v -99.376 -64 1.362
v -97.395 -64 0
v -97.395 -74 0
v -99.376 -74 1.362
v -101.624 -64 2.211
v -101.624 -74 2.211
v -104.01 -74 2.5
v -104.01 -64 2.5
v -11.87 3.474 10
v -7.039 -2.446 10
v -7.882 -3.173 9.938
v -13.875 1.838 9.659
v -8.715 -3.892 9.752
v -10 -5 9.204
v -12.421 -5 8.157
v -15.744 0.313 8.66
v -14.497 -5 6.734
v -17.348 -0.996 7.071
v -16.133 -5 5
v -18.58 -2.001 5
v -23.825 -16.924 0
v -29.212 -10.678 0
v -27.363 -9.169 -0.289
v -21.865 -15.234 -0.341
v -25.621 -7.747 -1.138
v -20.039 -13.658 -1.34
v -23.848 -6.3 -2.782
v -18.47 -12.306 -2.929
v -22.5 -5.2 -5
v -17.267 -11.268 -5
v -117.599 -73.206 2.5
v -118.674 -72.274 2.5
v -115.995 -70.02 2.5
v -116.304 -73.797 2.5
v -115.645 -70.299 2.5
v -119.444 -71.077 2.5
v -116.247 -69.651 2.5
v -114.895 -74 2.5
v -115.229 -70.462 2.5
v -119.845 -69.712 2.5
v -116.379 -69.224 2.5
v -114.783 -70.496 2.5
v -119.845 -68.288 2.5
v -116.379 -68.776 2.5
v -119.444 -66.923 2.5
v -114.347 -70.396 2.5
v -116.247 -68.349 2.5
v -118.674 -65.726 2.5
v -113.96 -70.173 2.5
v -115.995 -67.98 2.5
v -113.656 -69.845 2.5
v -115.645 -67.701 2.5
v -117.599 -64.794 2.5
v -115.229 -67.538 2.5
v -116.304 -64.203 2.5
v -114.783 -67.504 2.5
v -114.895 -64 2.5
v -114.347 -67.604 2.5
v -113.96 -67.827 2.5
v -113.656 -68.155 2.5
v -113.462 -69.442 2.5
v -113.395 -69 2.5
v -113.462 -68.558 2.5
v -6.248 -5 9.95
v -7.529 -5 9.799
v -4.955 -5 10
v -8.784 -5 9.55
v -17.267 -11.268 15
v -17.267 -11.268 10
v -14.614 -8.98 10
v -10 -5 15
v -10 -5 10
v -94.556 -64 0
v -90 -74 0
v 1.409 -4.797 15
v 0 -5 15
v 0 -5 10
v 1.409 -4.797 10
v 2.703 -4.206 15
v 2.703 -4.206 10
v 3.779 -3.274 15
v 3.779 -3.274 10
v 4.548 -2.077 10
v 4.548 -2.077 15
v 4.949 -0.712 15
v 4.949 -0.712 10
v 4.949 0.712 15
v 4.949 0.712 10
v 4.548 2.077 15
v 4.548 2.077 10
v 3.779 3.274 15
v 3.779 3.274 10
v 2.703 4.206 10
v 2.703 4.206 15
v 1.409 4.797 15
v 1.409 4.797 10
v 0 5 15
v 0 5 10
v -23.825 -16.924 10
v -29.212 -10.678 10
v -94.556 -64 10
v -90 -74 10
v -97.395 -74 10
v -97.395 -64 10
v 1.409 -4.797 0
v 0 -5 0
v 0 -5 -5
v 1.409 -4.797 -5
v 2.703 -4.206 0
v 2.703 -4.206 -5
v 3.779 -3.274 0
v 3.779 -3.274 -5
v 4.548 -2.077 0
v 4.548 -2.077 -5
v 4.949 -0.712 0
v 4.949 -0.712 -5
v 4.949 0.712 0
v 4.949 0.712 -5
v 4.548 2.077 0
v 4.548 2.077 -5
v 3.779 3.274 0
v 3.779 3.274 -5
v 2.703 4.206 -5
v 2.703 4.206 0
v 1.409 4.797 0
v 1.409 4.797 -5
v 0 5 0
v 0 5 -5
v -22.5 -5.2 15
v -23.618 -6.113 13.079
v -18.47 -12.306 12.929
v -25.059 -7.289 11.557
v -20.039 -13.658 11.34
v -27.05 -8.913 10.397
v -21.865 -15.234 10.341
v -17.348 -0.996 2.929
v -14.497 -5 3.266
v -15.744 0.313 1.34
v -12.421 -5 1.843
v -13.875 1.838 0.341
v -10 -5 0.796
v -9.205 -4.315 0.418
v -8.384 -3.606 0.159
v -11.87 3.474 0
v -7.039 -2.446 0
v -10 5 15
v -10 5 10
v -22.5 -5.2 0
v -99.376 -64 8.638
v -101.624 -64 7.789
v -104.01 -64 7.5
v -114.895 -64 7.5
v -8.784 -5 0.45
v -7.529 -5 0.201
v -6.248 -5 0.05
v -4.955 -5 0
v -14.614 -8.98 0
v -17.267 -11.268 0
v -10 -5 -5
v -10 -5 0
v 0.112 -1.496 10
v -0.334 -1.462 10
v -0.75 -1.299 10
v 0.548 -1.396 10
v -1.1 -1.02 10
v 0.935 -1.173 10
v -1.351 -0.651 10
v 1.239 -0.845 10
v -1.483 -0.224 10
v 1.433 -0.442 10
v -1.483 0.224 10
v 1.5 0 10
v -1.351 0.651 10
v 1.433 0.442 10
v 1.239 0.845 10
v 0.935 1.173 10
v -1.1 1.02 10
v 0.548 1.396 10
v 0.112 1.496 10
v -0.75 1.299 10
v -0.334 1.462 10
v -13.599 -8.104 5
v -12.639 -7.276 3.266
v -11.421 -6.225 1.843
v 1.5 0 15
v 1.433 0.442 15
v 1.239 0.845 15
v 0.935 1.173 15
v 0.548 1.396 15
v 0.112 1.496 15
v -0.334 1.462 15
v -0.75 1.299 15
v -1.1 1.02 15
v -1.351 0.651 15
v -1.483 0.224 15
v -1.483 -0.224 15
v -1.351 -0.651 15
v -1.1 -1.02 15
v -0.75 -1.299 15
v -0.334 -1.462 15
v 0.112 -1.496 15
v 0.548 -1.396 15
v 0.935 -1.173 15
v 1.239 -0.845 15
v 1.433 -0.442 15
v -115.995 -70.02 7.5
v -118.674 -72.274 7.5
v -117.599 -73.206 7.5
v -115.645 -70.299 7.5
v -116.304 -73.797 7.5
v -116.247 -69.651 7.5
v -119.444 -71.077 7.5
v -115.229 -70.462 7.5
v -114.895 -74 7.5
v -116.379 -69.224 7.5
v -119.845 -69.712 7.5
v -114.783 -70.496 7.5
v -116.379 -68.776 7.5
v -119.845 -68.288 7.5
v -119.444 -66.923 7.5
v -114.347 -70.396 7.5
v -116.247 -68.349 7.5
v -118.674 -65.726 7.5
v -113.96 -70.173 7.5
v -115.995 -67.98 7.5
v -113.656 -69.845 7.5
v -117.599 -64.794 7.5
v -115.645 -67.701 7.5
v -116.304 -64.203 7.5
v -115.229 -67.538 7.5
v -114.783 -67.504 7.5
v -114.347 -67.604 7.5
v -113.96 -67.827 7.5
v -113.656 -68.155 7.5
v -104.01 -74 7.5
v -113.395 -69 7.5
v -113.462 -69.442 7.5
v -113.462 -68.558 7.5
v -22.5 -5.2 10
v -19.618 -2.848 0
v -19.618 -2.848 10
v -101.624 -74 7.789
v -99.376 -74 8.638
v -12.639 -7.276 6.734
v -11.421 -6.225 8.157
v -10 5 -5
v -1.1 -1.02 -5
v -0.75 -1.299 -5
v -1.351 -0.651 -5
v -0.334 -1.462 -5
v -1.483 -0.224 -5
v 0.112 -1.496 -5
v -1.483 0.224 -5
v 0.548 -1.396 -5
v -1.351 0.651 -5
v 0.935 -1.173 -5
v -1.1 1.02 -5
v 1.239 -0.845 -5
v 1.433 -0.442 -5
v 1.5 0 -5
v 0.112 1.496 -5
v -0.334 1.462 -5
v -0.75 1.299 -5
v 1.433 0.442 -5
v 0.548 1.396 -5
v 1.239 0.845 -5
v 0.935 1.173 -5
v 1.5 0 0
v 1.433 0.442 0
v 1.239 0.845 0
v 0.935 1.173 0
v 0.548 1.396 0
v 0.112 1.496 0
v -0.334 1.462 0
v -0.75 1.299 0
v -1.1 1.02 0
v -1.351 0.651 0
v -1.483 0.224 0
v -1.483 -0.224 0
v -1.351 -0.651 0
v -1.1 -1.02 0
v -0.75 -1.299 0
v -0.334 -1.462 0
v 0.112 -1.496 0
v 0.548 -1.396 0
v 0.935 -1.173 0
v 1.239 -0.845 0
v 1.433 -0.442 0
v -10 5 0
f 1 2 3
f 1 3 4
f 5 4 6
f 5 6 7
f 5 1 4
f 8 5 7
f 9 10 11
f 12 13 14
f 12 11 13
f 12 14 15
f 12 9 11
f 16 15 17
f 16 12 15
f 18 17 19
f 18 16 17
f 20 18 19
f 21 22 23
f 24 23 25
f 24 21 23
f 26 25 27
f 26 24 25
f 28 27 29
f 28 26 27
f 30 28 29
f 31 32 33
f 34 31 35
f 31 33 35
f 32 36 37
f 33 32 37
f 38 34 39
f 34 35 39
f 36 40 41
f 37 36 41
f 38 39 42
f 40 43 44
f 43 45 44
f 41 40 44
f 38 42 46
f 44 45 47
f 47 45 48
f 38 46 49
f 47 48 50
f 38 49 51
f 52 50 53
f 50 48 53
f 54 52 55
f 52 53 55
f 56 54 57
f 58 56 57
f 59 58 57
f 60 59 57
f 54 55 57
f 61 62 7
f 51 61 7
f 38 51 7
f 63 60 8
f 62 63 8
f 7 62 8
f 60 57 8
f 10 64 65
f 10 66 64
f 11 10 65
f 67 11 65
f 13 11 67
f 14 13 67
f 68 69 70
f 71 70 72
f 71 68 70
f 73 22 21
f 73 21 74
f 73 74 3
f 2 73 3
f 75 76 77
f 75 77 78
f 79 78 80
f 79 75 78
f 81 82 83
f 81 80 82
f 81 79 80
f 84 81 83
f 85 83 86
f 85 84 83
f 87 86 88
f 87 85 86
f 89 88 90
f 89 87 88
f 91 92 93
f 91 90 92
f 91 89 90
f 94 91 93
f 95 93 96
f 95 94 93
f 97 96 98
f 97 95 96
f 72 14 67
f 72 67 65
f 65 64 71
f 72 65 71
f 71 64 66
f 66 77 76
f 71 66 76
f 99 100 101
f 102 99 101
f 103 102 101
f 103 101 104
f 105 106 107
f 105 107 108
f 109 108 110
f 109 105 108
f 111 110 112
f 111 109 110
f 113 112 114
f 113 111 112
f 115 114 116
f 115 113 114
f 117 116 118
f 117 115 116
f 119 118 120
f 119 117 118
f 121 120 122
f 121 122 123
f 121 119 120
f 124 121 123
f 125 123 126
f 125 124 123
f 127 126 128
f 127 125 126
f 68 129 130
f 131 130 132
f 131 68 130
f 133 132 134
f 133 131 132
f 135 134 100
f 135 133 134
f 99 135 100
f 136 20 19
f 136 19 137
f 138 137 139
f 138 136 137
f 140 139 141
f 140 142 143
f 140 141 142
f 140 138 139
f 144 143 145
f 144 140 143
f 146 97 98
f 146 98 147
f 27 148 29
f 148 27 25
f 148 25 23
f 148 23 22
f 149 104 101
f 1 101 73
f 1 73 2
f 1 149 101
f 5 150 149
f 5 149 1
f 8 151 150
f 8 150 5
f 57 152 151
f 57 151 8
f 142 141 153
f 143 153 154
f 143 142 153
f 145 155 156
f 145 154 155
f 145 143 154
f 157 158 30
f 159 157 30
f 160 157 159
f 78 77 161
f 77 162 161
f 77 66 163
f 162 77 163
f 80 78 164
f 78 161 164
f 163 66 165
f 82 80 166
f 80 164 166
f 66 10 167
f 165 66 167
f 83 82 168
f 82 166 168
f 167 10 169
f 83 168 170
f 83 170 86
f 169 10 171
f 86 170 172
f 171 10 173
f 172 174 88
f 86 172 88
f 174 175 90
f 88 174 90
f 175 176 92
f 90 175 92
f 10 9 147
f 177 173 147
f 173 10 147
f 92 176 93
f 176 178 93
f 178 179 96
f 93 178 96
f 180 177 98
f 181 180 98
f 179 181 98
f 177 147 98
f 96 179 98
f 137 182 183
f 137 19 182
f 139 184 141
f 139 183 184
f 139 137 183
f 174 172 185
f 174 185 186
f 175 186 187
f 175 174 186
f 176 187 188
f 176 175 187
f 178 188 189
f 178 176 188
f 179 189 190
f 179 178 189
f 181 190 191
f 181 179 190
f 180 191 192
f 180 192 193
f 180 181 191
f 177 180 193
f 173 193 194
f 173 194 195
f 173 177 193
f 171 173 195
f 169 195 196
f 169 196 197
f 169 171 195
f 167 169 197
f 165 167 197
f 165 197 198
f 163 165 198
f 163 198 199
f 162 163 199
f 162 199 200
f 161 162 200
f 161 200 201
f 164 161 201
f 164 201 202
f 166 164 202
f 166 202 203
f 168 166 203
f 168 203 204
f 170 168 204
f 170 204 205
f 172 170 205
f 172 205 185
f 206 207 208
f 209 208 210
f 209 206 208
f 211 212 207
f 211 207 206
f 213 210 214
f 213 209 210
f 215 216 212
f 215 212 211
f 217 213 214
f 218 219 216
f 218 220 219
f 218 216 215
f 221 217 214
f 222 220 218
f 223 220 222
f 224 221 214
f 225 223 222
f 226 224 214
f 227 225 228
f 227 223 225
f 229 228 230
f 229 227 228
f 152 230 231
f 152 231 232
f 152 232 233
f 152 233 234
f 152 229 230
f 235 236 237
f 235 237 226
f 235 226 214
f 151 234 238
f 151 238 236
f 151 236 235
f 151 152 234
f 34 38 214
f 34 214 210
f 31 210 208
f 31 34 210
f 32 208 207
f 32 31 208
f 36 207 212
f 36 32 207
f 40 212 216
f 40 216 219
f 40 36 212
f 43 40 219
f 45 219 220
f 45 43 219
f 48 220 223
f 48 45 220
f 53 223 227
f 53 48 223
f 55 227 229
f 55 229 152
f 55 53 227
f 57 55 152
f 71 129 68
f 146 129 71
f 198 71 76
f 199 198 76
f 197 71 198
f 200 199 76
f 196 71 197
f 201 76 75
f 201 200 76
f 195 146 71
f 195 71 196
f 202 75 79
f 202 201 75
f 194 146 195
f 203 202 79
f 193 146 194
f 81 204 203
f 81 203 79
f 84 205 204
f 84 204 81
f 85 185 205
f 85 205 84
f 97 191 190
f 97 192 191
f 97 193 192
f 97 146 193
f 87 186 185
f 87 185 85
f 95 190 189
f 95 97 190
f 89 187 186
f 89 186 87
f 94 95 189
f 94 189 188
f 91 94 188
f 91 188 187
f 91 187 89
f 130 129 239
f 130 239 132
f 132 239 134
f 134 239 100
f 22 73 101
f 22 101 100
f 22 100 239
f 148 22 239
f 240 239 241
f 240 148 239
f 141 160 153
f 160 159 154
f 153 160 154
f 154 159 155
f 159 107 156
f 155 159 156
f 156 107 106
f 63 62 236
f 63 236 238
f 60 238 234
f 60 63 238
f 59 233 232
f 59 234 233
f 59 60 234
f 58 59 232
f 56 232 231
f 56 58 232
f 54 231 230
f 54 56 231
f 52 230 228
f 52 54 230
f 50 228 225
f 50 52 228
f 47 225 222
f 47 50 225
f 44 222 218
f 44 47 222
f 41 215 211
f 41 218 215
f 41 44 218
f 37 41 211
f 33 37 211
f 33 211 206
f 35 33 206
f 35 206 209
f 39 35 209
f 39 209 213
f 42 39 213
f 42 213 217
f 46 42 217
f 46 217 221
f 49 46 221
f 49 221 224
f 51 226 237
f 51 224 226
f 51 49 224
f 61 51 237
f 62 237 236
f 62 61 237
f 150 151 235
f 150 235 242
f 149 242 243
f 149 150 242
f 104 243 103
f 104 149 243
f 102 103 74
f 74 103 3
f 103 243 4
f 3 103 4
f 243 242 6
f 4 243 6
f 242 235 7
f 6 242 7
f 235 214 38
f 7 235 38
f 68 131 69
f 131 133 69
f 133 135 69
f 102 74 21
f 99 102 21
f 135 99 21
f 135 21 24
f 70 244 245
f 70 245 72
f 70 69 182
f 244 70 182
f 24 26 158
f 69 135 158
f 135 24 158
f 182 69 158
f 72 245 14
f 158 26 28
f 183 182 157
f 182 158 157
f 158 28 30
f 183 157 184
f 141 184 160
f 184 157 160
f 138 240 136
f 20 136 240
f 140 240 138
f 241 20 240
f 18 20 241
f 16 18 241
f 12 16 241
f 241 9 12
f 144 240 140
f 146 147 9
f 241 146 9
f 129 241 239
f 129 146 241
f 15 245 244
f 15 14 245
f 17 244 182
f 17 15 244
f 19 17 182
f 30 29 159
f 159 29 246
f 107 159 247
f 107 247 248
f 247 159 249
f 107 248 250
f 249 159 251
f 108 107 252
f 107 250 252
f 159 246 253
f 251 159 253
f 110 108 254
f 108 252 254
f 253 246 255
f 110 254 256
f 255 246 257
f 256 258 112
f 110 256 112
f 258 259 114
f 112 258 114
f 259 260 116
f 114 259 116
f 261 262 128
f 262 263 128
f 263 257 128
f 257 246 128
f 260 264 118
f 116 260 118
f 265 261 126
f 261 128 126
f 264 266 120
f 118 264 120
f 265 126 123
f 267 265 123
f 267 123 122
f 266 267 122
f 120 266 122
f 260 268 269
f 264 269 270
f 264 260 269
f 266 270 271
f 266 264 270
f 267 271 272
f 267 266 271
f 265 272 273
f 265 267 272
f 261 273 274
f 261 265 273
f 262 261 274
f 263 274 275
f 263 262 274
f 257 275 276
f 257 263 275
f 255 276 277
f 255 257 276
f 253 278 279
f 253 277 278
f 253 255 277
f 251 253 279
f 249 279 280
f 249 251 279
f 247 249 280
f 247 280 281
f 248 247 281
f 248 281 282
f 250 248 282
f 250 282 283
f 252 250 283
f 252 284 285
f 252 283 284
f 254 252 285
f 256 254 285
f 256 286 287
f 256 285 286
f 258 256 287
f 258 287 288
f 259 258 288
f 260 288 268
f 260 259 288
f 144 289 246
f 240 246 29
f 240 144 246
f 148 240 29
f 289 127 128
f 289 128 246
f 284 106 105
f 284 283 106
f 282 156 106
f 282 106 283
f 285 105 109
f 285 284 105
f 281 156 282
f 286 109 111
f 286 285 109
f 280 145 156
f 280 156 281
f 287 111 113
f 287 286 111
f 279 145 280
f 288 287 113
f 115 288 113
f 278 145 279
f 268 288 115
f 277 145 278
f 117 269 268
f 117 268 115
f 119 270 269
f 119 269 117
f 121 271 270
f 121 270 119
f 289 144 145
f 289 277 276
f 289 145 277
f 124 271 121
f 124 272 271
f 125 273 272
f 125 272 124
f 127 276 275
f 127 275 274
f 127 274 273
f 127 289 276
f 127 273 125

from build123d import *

# Parameters (mm, degrees)
CROQUIS1_R              = 1.5
SALIENTE_EXTRUIR1_DEPTH = 10
CROQUIS2_W              = 45
CROQUIS2_H              = 10.081197804
CORTAR_EXTRUIR1_DEPTH   = 50
CROQUIS3_R              = 1.5
SALIENTE_EXTRUIR2_DEPTH = 10
CROQUIS4_W              = 25
CROQUIS4_H              = 10
CORTAR_EXTRUIR2_DEPTH   = 50
SALIENTE_EXTRUIR3_DEPTH = 10
CROQUIS7_W              = 22
CROQUIS7_H              = 10
CORTAR_EXTRUIR4_DEPTH   = 20
REDONDEO1_R             = 10


with BuildPart() as part:
    # Croquis1 → Saliente-Extruir1 (new body)
    with BuildSketch(Plane.XY):
        with BuildLine():
            Line((0, -5), (-10, -5))
            Line((-10, -5), (-90, -74))
            Line((-90, -74), (-114.8954508, -74))
            ThreePointArc((-114.8954508, -74), (-119.8954508, -69), (-114.8954508, -64))
            Line((-114.8954508, -64), (-94.556304917, -64))
            Line((-94.556304917, -64), (-10, 5))
            Line((-10, 5), (0, 5))
            ThreePointArc((0, 5), (5, 0), (0, -5))
        make_face()
        Circle(CROQUIS1_R, mode=Mode.SUBTRACT)
        with Locations((-114.8954508, -69)):
            Circle(CROQUIS1_R, mode=Mode.SUBTRACT)
    extrude(amount=SALIENTE_EXTRUIR1_DEPTH)

    # Croquis2 → Cortar-Extruir1 (cut)
    with BuildSketch(Plane(origin=(0, -64, 0), x_dir=(1, 0, 0), z_dir=(0, 1, 0))):
        with Locations((-119.8954508, 2.540598902)):
            Rectangle(CROQUIS2_W, CROQUIS2_H)
        with Locations((-119.8954508, -12.540598902)):
            Rectangle(CROQUIS2_W, CROQUIS2_H)
    extrude(amount=-CORTAR_EXTRUIR1_DEPTH, mode=Mode.SUBTRACT)

    # Croquis3 → Saliente-Extruir2 (add, symmetric)
    with BuildSketch(Plane.XY.offset(5)):
        with BuildLine():
            Line((0, 5), (-10, 5))
            Line((-10, 5), (-10, -5))
            Line((-10, -5), (0, -5))
            ThreePointArc((0, -5), (5, 0), (0, 5))
        make_face()
        Circle(CROQUIS3_R, mode=Mode.SUBTRACT)
    extrude(amount=SALIENTE_EXTRUIR2_DEPTH, both=True)

    # Croquis4 → Cortar-Extruir2 (cut)
    with BuildSketch(Plane(origin=(0, 5, 0), x_dir=(1, 0, 0), z_dir=(0, 1, 0))):
        with Locations((5, -5)):
            Rectangle(CROQUIS4_W, CROQUIS4_H)
    extrude(amount=-CORTAR_EXTRUIR2_DEPTH, mode=Mode.SUBTRACT)

    # Croquis5 → Saliente-Extruir3 (add, symmetric)
    with BuildSketch(Plane.XY.offset(5)):
        Polygon((-22.5, -5.200303819), (-17.266882634, -11.267686272), (-10, -5), (-10, 5), align=None)
    extrude(amount=SALIENTE_EXTRUIR3_DEPTH, both=True)

    # Croquis7 → Cortar-Extruir4 (cut)
    with BuildSketch(Plane(origin=(-6.446429036, 7.899800278, 0), x_dir=(0.7747758954984266, 0.6322359620858428, 0), z_dir=(-0.6322359620858428, 0.7747758954984267, 0))):
        with Locations((-6, -5)):
            Rectangle(CROQUIS7_W, CROQUIS7_H)
    extrude(amount=-CORTAR_EXTRUIR4_DEPTH, mode=Mode.SUBTRACT)

    # Redondeo1
    # the kernel refuses this fillet: 10 mm, written as the material it adds along each edge
    with BuildSketch(Plane(origin=(-17.266882634, -11.267686272, 0), x_dir=(0, 0, -1), z_dir=(-0.6531268480840459, 0.757248519517734, 0))) as redondeo1_piece_1_section:
        with BuildLine():
            CenterArc((10, 8.660254038), REDONDEO1_R, 180, 60)
            Line((0, 8.660254038), (-0.2, 8.660254038))
            Line((-0.2, 8.660254038), (-0.2, 0))
            Line((-0.2, 0), (0, -0.2))
            ThreePointArc((0, -0.2), (2.5, -0.2), (4.9, -0.173205081))
            Line((4.9, -0.173205081), (5, 0))
        make_face()
    redondeo1_piece_1 = extrude(amount=29.663040925, mode=Mode.PRIVATE)
    redondeo1_piece_1 = split(redondeo1_piece_1, bisect_by=Plane(origin=(-24.101226761, -6.506943775, -1.290515282), z_dir=(0.6322359620858427, -0.7747758954984267, 0)), keep=Keep.TOP, mode=Mode.PRIVATE)
    add(redondeo1_piece_1)
    with BuildSketch(Plane(origin=(-97.3954508, -64, 2.5), x_dir=(-1, 0, 0), z_dir=(0, -1, 0))) as redondeo1_piece_2:
        with BuildLine():
            CenterArc((6.614378278, 10), REDONDEO1_R, 228.590377891, 41.409622109)
            Line((0, 2.5), (-0.132287566, 2.35))
            ThreePointArc((-0.132287566, 2.35), (-0.2, 1.25), (-0.2, 0))
            Line((-0.2, 0), (0, -0.2))
            Line((0, -0.2), (6.614378278, -0.2))
            Line((6.614378278, -0.2), (6.614378278, 0))
        make_face()
    extrude(amount=10)
    with BuildSketch(Plane(origin=(-97.3954508, -64, 7.5), x_dir=(0, 0, 1), z_dir=(0, -1, 0))) as redondeo1_piece_3:
        with BuildLine():
            CenterArc((10, 6.614378278), REDONDEO1_R, 180, 41.409622109)
            Line((0, 6.614378278), (-0.2, 6.614378278))
            Line((-0.2, 6.614378278), (-0.2, 0))
            Line((-0.2, 0), (0, -0.2))
            ThreePointArc((0, -0.2), (1.25, -0.2), (2.35, -0.132287566))
            Line((2.35, -0.132287566), (2.5, 0))
        make_face()
    extrude(amount=10)
    with BuildSketch(Plane(origin=(-17.266882634, -11.267686272, 10), x_dir=(-0.757248519517734, -0.6531268480840459, 0), z_dir=(-0.6531268480840459, 0.757248519517734, 0))) as redondeo1_piece_4_section:
        with BuildLine():
            CenterArc((8.660254038, 10), REDONDEO1_R, 210, 60)
            Line((0, 5), (-0.173205081, 4.9))
            ThreePointArc((-0.173205081, 4.9), (-0.2, 2.5), (-0.2, 0))
            Line((-0.2, 0), (0, -0.2))
            Line((0, -0.2), (8.660254038, -0.2))
            Line((8.660254038, -0.2), (8.660254038, 0))
        make_face()
    redondeo1_piece_4 = extrude(amount=29.663040925, mode=Mode.PRIVATE)
    redondeo1_piece_4 = split(redondeo1_piece_4, bisect_by=Plane(origin=(-24.101226761, -6.506943775, 11.290515282), z_dir=(0.6322359620858427, -0.7747758954984267, 0)), keep=Keep.TOP, mode=Mode.PRIVATE)
    add(redondeo1_piece_4)
    with BuildSketch(Plane(origin=(-19.617619259, -2.848211077, 0), x_dir=(0, 0, 1), z_dir=(0.6322359620858428, -0.7747758954984266, 0))) as redondeo1_piece_5_section:
        with BuildLine():
            CenterArc((REDONDEO1_R, -REDONDEO1_R), REDONDEO1_R, 90, 90)
            Line((0, -REDONDEO1_R), (-REDONDEO1_R * 0.02, -REDONDEO1_R))
            Line((-REDONDEO1_R * 0.02, -REDONDEO1_R), (-REDONDEO1_R * 0.02, REDONDEO1_R * 0.02))
            Line((-REDONDEO1_R * 0.02, REDONDEO1_R * 0.02), (REDONDEO1_R, REDONDEO1_R * 0.02))
            Line((REDONDEO1_R, REDONDEO1_R * 0.02), (REDONDEO1_R, 0))
        make_face()
    redondeo1_piece_5 = extrude(amount=32.91390687, mode=Mode.PRIVATE)
    redondeo1_piece_5 = split(redondeo1_piece_5, bisect_by=Plane(origin=(-15.697629804, -5, 1.81207327), z_dir=(0, 1, 0)), keep=Keep.TOP, mode=Mode.PRIVATE)
    redondeo1_piece_5 = split(redondeo1_piece_5, bisect_by=Plane(origin=(-12.240787311, -6.932679056, 1.81207327), z_dir=(-0.6531268480840465, 0.7572485195177333, 0)), keep=Keep.TOP, mode=Mode.PRIVATE)
    add(redondeo1_piece_5)
    with BuildSketch(Plane(origin=(-19.617619259, -2.848211077, 0), x_dir=(0, 0, 1), z_dir=(0.6322359620858428, -0.7747758954984266, 0))) as redondeo1_piece_6_section:
        with BuildLine():
            CenterArc((REDONDEO1_R, -REDONDEO1_R), REDONDEO1_R, 90, 90)
            Line((0, -REDONDEO1_R), (-REDONDEO1_R * 0.02, -REDONDEO1_R))
            Line((-REDONDEO1_R * 0.02, -REDONDEO1_R), (-REDONDEO1_R * 0.02, REDONDEO1_R * 0.02))
            Line((-REDONDEO1_R * 0.02, REDONDEO1_R * 0.02), (REDONDEO1_R, REDONDEO1_R * 0.02))
            Line((REDONDEO1_R, REDONDEO1_R * 0.02), (REDONDEO1_R, 0))
        make_face()
    redondeo1_piece_6 = extrude(amount=32.91390687, mode=Mode.PRIVATE)
    redondeo1_piece_6 = split(redondeo1_piece_6, bisect_by=Plane(origin=(-7.753376127, -5, 0.000921207), z_dir=(0, 1, 0)), keep=Keep.TOP, mode=Mode.PRIVATE)
    redondeo1_piece_6 = split(redondeo1_piece_6, bisect_by=Plane(origin=(-8.357285081, -3.583158383, 0.000921207), z_dir=(0.6531268480840465, -0.7572485195177333, 0)), keep=Keep.TOP, mode=Mode.PRIVATE)
    add(redondeo1_piece_6)
    with BuildSketch(Plane(origin=(-19.617619259, -2.848211077, 0), x_dir=(0, 0, 1), z_dir=(0.6322359620858428, -0.7747758954984266, 0))) as redondeo1_piece_7_section:
        with BuildLine():
            CenterArc((REDONDEO1_R, -REDONDEO1_R), REDONDEO1_R, 90, 90)
            Line((0, -REDONDEO1_R), (-REDONDEO1_R * 0.02, -REDONDEO1_R))
            Line((-REDONDEO1_R * 0.02, -REDONDEO1_R), (-REDONDEO1_R * 0.02, REDONDEO1_R * 0.02))
            Line((-REDONDEO1_R * 0.02, REDONDEO1_R * 0.02), (REDONDEO1_R, REDONDEO1_R * 0.02))
            Line((REDONDEO1_R, REDONDEO1_R * 0.02), (REDONDEO1_R, 0))
        make_face()
    redondeo1_piece_7 = extrude(amount=32.91390687, mode=Mode.PRIVATE)
    redondeo1_piece_7 = split(redondeo1_piece_7, bisect_by=Plane(origin=(-14.976833445, -5, 2.906461965), z_dir=(0, -1, 0)), keep=Keep.TOP, mode=Mode.PRIVATE)
    redondeo1_piece_7 = split(redondeo1_piece_7, bisect_by=Plane(origin=(-13.639024157, -8.138658336, 2.906461965), z_dir=(-0.6531268480840465, 0.7572485195177333, 0)), keep=Keep.TOP, mode=Mode.PRIVATE)
    add(redondeo1_piece_7)
    with BuildSketch(Plane(origin=(-19.617619259, -2.848211077, 10), x_dir=(0, 0, -1), z_dir=(0.6322359620858428, -0.7747758954984266, 0))) as redondeo1_piece_8_section:
        with BuildLine():
            CenterArc((REDONDEO1_R, REDONDEO1_R), REDONDEO1_R, 180, 90)
            Line((0, REDONDEO1_R), (-REDONDEO1_R * 0.02, REDONDEO1_R))
            Line((-REDONDEO1_R * 0.02, REDONDEO1_R), (-REDONDEO1_R * 0.02, -REDONDEO1_R * 0.02))
            Line((-REDONDEO1_R * 0.02, -REDONDEO1_R * 0.02), (REDONDEO1_R, -REDONDEO1_R * 0.02))
            Line((REDONDEO1_R, -REDONDEO1_R * 0.02), (REDONDEO1_R, 0))
        make_face()
    redondeo1_piece_8 = extrude(amount=32.91390687, mode=Mode.PRIVATE)
    redondeo1_piece_8 = split(redondeo1_piece_8, bisect_by=Plane(origin=(-15.697629804, -5, 8.18792673), z_dir=(0, 1, 0)), keep=Keep.TOP, mode=Mode.PRIVATE)
    redondeo1_piece_8 = split(redondeo1_piece_8, bisect_by=Plane(origin=(-12.240787311, -6.932679056, 8.18792673), z_dir=(-0.6531268480840465, 0.7572485195177333, 0)), keep=Keep.TOP, mode=Mode.PRIVATE)
    add(redondeo1_piece_8)
    with BuildSketch(Plane(origin=(-19.617619259, -2.848211077, 10), x_dir=(0, 0, -1), z_dir=(0.6322359620858428, -0.7747758954984266, 0))) as redondeo1_piece_9_section:
        with BuildLine():
            CenterArc((REDONDEO1_R, REDONDEO1_R), REDONDEO1_R, 180, 90)
            Line((0, REDONDEO1_R), (-REDONDEO1_R * 0.02, REDONDEO1_R))
            Line((-REDONDEO1_R * 0.02, REDONDEO1_R), (-REDONDEO1_R * 0.02, -REDONDEO1_R * 0.02))
            Line((-REDONDEO1_R * 0.02, -REDONDEO1_R * 0.02), (REDONDEO1_R, -REDONDEO1_R * 0.02))
            Line((REDONDEO1_R, -REDONDEO1_R * 0.02), (REDONDEO1_R, 0))
        make_face()
    redondeo1_piece_9 = extrude(amount=32.91390687, mode=Mode.PRIVATE)
    redondeo1_piece_9 = split(redondeo1_piece_9, bisect_by=Plane(origin=(-7.753376127, -5, 9.999078793), z_dir=(0, 1, 0)), keep=Keep.TOP, mode=Mode.PRIVATE)
    redondeo1_piece_9 = split(redondeo1_piece_9, bisect_by=Plane(origin=(-8.357285081, -3.583158383, 9.999078793), z_dir=(0.6531268480840465, -0.7572485195177333, 0)), keep=Keep.TOP, mode=Mode.PRIVATE)
    add(redondeo1_piece_9)
    with BuildSketch(Plane(origin=(-19.617619259, -2.848211077, 10), x_dir=(0, 0, -1), z_dir=(0.6322359620858428, -0.7747758954984266, 0))) as redondeo1_piece_10_section:
        with BuildLine():
            CenterArc((REDONDEO1_R, REDONDEO1_R), REDONDEO1_R, 180, 90)
            Line((0, REDONDEO1_R), (-REDONDEO1_R * 0.02, REDONDEO1_R))
            Line((-REDONDEO1_R * 0.02, REDONDEO1_R), (-REDONDEO1_R * 0.02, -REDONDEO1_R * 0.02))
            Line((-REDONDEO1_R * 0.02, -REDONDEO1_R * 0.02), (REDONDEO1_R, -REDONDEO1_R * 0.02))
            Line((REDONDEO1_R, -REDONDEO1_R * 0.02), (REDONDEO1_R, 0))
        make_face()
    redondeo1_piece_10 = extrude(amount=32.91390687, mode=Mode.PRIVATE)
    redondeo1_piece_10 = split(redondeo1_piece_10, bisect_by=Plane(origin=(-14.976833445, -5, 7.093538035), z_dir=(0, -1, 0)), keep=Keep.TOP, mode=Mode.PRIVATE)
    redondeo1_piece_10 = split(redondeo1_piece_10, bisect_by=Plane(origin=(-13.639024157, -8.138658336, 7.093538035), z_dir=(-0.6531268480840465, 0.7572485195177333, 0)), keep=Keep.TOP, mode=Mode.PRIVATE)
    add(redondeo1_piece_10)


solid = part.part
